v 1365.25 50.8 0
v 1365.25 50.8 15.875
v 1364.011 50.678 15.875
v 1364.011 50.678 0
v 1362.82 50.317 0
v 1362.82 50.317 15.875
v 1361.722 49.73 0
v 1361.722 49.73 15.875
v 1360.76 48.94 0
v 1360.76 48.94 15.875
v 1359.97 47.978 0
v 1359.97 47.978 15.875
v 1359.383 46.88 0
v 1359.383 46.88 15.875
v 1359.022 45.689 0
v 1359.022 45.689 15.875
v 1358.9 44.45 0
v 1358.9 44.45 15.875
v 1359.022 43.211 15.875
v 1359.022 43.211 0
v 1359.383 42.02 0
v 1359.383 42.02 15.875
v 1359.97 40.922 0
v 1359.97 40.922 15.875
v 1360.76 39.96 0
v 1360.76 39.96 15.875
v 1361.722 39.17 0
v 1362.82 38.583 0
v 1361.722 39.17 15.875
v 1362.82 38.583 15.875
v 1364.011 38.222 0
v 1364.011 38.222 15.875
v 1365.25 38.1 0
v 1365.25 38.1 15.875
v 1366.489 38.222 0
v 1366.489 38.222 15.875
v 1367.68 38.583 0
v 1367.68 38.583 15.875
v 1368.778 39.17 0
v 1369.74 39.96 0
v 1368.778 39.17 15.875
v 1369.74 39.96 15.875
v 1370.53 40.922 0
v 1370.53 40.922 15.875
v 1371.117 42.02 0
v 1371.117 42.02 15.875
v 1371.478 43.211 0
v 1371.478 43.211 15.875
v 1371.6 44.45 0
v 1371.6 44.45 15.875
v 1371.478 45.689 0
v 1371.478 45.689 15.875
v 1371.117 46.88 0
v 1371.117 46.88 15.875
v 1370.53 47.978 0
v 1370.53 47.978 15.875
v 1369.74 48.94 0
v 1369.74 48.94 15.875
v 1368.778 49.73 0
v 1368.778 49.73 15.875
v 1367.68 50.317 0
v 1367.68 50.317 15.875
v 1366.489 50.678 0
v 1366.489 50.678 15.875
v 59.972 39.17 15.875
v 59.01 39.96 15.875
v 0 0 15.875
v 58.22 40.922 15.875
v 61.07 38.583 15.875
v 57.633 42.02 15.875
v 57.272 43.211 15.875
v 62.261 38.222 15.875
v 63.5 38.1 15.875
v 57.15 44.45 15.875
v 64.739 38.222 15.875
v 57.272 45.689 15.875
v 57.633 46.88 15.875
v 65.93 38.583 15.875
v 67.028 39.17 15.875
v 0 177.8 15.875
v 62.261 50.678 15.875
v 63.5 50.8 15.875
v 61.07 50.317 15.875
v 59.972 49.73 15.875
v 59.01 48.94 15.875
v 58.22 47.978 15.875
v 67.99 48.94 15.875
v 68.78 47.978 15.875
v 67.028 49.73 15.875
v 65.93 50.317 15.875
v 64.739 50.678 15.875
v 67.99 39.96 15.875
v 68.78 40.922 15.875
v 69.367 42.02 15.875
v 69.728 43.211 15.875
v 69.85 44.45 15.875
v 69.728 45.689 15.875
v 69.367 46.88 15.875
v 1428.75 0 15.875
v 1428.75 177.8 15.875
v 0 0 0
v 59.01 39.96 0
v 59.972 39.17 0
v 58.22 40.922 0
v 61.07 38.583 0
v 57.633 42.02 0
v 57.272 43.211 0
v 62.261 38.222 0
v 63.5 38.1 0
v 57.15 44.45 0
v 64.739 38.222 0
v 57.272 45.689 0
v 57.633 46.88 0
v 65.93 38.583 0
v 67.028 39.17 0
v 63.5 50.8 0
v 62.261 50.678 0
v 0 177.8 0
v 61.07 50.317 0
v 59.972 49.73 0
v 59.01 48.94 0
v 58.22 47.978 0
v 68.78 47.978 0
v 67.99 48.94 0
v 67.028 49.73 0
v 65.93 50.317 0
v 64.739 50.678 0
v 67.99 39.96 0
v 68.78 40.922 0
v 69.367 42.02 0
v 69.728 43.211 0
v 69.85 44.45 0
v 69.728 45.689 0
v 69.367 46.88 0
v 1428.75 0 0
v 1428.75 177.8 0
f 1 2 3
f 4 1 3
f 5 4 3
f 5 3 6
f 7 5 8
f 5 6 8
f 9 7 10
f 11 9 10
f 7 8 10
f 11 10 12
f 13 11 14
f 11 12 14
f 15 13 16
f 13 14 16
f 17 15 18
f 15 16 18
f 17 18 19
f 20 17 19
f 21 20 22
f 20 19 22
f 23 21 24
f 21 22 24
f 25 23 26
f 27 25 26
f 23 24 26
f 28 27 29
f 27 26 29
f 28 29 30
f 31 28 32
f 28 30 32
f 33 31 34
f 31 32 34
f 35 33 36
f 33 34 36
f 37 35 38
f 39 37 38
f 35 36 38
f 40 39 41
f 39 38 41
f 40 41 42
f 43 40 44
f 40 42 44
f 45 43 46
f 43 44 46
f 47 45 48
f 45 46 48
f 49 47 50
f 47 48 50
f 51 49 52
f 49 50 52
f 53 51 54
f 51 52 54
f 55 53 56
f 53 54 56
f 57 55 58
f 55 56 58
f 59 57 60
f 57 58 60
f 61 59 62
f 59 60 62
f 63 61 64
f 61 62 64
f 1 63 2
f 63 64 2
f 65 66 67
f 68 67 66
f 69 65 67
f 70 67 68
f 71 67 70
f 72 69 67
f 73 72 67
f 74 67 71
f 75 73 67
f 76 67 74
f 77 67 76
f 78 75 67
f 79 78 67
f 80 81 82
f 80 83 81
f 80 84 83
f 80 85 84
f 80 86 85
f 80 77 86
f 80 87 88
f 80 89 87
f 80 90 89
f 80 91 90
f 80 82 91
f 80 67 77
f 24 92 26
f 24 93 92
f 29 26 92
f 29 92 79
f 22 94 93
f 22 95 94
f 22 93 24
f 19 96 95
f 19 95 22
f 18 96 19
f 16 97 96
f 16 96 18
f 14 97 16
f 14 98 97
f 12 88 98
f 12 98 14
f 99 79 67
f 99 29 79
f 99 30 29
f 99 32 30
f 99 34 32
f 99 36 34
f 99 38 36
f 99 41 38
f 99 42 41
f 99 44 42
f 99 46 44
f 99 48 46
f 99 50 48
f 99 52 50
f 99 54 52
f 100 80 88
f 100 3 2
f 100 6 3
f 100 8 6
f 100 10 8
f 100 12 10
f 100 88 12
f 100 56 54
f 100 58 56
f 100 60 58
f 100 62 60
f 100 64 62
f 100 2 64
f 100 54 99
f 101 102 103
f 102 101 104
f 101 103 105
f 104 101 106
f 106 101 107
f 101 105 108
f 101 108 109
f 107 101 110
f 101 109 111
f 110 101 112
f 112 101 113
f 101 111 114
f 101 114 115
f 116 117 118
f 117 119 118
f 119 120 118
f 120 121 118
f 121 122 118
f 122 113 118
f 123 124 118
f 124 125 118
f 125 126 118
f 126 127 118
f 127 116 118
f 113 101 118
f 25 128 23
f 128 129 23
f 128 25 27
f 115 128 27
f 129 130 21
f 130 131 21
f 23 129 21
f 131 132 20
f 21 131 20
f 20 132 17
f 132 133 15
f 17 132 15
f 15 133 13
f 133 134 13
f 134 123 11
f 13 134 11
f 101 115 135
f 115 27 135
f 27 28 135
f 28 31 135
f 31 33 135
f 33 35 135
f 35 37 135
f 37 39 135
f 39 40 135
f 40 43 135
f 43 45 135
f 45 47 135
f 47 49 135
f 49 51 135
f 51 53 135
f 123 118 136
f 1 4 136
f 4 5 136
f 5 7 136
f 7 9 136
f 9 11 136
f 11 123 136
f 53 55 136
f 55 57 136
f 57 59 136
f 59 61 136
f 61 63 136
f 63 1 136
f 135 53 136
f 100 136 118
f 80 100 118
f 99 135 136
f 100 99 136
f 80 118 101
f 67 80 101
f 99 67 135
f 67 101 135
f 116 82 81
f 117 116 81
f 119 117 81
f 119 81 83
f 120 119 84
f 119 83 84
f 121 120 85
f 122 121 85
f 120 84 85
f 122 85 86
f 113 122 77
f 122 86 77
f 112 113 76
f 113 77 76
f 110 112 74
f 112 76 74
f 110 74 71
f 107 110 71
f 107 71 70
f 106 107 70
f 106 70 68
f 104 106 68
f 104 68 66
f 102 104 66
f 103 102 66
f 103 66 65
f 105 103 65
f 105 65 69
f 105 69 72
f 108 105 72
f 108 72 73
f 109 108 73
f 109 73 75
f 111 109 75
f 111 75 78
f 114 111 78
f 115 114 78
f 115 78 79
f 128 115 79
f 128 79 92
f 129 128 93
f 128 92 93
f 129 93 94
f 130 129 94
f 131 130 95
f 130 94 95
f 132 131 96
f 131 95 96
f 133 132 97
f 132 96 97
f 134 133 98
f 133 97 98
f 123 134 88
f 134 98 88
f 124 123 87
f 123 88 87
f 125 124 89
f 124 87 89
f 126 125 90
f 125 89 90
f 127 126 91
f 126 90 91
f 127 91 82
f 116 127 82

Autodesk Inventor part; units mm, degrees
ref_plane "YZ Plane" through (0, 0, 0) normal (1, 0, 0) x (0, 1, 0)
ref_plane "XZ Plane" through (0, 0, 0) normal (0, 1, 0) x (-1, 0, 0)
ref_plane "XY Plane" through (0, 0, 0) normal (0, 0, 1) x (1, 0, 0)
sketch "Sketch1" plane through (0, 0, 0) normal (0, 0, 1) x (1, 0, 0)
  line L0 (0, 0) -> (1428.75, 0)
  line L1 (1428.75, 0) -> (1428.75, 177.8)
  line L2 (1428.75, 177.8) -> (0, 177.8)
  line L3 (0, 177.8) -> (0, 0)
  dimension "d0" = 1428.75
  dimension "d1" = 177.8
extrude "Extrusion1" add sketch "Sketch1" along normal blind 15.875
sketch "Sketch2" plane through (0, 0, 0) normal (0, 0, -1) x (-1, 0, 0)
  line L0 (0, 0) -> (-63.5, 0)
  line L1 (-63.5, 0) -> (-63.5, 44.45)
  line L2 (-63.5, 44.45) -> (0, 44.45)
  line L3 (0, 44.45) -> (0, 0)
  line L4 (-1428.75, 0) -> (-1365.25, 0)
  line L5 (-1365.25, 0) -> (-1365.25, 44.45)
  line L6 (-1365.25, 44.45) -> (-1428.75, 44.45)
  line L7 (-1428.75, 44.45) -> (-1428.75, 0)
  dimension "d4" = 63.5
  dimension "d5" = 44.45
  dimension "d6" = 63.5
  dimension "d7" = 44.45
hole "Hole1" at (63.5, 44.45, 0) at (1365.25, 44.45, 0) at (63.5, 44.45, 0) direction (0, 0, 1) diameter 12.7 end through all
properties part number "7x56.25 Gyp"
